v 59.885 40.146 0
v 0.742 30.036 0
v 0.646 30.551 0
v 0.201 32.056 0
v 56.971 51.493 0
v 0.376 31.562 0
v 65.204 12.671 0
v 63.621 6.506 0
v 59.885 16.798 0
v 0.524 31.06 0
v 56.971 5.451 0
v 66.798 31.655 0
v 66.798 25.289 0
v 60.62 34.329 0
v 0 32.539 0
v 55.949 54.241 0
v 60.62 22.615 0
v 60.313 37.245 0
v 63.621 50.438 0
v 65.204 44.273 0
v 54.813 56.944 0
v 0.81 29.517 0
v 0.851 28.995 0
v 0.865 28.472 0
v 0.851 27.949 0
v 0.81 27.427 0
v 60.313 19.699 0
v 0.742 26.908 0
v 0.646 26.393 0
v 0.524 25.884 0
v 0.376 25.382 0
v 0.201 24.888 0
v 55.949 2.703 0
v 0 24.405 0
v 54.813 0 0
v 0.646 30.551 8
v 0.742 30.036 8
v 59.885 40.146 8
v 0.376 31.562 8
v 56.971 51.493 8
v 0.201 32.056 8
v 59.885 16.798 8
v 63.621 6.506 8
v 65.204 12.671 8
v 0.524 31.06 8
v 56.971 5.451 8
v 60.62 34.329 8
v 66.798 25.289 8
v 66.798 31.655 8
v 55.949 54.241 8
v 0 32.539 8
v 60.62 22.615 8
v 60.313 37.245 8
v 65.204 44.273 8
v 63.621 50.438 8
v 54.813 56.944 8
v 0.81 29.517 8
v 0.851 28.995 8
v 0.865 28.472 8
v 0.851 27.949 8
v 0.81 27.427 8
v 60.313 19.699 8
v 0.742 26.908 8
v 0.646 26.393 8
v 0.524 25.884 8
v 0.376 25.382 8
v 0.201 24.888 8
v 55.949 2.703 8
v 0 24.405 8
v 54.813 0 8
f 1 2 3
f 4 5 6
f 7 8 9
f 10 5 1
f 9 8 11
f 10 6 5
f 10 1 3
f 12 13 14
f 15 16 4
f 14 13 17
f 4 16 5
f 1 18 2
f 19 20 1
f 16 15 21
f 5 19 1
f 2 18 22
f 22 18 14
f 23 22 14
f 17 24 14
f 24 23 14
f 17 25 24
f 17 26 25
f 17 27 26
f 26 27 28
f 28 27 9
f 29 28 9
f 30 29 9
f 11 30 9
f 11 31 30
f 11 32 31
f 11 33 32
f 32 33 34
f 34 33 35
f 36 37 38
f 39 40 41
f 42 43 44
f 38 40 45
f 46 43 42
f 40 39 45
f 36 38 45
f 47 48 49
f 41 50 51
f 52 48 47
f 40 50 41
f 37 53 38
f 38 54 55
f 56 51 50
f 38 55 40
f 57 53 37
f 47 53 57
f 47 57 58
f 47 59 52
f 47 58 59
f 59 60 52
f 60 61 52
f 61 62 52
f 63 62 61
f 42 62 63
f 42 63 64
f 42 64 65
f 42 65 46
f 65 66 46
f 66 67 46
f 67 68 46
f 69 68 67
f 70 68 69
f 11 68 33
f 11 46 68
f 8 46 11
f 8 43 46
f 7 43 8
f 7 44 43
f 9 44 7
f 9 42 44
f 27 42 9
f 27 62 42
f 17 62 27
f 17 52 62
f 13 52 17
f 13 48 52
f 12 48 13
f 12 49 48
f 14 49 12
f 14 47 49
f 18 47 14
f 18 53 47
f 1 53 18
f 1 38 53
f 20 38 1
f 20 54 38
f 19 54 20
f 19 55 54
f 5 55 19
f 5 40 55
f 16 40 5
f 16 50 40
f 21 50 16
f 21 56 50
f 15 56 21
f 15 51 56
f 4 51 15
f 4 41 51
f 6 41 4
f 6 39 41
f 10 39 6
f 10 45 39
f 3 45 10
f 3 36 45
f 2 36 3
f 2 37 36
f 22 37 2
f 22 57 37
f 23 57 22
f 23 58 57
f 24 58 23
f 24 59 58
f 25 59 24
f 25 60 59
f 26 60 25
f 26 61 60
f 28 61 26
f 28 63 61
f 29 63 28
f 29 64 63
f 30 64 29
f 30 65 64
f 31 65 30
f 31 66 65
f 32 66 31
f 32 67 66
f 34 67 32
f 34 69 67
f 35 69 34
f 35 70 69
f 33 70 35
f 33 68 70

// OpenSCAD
$fn = 32;

// ----------------------------------------------------------------------
// Gear sector: 3 teeth on 48 degrees
// ----------------------------------------------------------------------

// --- parameters (mm) ---
sector_angle = 48;        // sector angle, degrees
root_r = 70;              // root circle radius
tooth_h = 6;              // tooth height over the root circle
teeth = 3;                // number of teeth on the sector
hub_r = 10;               // hub bore radius
plate_t = 8;              // sector thickness, Z
arc_step = 3;             // sampling step of the root/hub arcs, degrees

tip_r = root_r + tooth_h;  // tip circle radius

profile = [[54.813, 0], [55.949, 2.703], [56.971, 5.451], [63.621, 6.506], [65.204, 12.671], [59.885, 16.798], [60.313, 19.699], [60.62, 22.615], [66.798, 25.289], [66.798, 31.655], [60.62, 34.329], [60.313, 37.245], [59.885, 40.146], [65.204, 44.273], [63.621, 50.438], [56.971, 51.493], [55.949, 54.241], [54.813, 56.944], [0, 32.539], [0.201, 32.056], [0.376, 31.562], [0.524, 31.06], [0.646, 30.551], [0.742, 30.036], [0.81, 29.517], [0.851, 28.995], [0.865, 28.472], [0.851, 27.949], [0.81, 27.427], [0.742, 26.908], [0.646, 26.393], [0.524, 25.884], [0.376, 25.382], [0.201, 24.888], [0, 24.405]];  // primary outline, 35 points, counter clockwise

// --- the one profile operation ---
linear_extrude(height = plate_t) polygon(points = profile);
